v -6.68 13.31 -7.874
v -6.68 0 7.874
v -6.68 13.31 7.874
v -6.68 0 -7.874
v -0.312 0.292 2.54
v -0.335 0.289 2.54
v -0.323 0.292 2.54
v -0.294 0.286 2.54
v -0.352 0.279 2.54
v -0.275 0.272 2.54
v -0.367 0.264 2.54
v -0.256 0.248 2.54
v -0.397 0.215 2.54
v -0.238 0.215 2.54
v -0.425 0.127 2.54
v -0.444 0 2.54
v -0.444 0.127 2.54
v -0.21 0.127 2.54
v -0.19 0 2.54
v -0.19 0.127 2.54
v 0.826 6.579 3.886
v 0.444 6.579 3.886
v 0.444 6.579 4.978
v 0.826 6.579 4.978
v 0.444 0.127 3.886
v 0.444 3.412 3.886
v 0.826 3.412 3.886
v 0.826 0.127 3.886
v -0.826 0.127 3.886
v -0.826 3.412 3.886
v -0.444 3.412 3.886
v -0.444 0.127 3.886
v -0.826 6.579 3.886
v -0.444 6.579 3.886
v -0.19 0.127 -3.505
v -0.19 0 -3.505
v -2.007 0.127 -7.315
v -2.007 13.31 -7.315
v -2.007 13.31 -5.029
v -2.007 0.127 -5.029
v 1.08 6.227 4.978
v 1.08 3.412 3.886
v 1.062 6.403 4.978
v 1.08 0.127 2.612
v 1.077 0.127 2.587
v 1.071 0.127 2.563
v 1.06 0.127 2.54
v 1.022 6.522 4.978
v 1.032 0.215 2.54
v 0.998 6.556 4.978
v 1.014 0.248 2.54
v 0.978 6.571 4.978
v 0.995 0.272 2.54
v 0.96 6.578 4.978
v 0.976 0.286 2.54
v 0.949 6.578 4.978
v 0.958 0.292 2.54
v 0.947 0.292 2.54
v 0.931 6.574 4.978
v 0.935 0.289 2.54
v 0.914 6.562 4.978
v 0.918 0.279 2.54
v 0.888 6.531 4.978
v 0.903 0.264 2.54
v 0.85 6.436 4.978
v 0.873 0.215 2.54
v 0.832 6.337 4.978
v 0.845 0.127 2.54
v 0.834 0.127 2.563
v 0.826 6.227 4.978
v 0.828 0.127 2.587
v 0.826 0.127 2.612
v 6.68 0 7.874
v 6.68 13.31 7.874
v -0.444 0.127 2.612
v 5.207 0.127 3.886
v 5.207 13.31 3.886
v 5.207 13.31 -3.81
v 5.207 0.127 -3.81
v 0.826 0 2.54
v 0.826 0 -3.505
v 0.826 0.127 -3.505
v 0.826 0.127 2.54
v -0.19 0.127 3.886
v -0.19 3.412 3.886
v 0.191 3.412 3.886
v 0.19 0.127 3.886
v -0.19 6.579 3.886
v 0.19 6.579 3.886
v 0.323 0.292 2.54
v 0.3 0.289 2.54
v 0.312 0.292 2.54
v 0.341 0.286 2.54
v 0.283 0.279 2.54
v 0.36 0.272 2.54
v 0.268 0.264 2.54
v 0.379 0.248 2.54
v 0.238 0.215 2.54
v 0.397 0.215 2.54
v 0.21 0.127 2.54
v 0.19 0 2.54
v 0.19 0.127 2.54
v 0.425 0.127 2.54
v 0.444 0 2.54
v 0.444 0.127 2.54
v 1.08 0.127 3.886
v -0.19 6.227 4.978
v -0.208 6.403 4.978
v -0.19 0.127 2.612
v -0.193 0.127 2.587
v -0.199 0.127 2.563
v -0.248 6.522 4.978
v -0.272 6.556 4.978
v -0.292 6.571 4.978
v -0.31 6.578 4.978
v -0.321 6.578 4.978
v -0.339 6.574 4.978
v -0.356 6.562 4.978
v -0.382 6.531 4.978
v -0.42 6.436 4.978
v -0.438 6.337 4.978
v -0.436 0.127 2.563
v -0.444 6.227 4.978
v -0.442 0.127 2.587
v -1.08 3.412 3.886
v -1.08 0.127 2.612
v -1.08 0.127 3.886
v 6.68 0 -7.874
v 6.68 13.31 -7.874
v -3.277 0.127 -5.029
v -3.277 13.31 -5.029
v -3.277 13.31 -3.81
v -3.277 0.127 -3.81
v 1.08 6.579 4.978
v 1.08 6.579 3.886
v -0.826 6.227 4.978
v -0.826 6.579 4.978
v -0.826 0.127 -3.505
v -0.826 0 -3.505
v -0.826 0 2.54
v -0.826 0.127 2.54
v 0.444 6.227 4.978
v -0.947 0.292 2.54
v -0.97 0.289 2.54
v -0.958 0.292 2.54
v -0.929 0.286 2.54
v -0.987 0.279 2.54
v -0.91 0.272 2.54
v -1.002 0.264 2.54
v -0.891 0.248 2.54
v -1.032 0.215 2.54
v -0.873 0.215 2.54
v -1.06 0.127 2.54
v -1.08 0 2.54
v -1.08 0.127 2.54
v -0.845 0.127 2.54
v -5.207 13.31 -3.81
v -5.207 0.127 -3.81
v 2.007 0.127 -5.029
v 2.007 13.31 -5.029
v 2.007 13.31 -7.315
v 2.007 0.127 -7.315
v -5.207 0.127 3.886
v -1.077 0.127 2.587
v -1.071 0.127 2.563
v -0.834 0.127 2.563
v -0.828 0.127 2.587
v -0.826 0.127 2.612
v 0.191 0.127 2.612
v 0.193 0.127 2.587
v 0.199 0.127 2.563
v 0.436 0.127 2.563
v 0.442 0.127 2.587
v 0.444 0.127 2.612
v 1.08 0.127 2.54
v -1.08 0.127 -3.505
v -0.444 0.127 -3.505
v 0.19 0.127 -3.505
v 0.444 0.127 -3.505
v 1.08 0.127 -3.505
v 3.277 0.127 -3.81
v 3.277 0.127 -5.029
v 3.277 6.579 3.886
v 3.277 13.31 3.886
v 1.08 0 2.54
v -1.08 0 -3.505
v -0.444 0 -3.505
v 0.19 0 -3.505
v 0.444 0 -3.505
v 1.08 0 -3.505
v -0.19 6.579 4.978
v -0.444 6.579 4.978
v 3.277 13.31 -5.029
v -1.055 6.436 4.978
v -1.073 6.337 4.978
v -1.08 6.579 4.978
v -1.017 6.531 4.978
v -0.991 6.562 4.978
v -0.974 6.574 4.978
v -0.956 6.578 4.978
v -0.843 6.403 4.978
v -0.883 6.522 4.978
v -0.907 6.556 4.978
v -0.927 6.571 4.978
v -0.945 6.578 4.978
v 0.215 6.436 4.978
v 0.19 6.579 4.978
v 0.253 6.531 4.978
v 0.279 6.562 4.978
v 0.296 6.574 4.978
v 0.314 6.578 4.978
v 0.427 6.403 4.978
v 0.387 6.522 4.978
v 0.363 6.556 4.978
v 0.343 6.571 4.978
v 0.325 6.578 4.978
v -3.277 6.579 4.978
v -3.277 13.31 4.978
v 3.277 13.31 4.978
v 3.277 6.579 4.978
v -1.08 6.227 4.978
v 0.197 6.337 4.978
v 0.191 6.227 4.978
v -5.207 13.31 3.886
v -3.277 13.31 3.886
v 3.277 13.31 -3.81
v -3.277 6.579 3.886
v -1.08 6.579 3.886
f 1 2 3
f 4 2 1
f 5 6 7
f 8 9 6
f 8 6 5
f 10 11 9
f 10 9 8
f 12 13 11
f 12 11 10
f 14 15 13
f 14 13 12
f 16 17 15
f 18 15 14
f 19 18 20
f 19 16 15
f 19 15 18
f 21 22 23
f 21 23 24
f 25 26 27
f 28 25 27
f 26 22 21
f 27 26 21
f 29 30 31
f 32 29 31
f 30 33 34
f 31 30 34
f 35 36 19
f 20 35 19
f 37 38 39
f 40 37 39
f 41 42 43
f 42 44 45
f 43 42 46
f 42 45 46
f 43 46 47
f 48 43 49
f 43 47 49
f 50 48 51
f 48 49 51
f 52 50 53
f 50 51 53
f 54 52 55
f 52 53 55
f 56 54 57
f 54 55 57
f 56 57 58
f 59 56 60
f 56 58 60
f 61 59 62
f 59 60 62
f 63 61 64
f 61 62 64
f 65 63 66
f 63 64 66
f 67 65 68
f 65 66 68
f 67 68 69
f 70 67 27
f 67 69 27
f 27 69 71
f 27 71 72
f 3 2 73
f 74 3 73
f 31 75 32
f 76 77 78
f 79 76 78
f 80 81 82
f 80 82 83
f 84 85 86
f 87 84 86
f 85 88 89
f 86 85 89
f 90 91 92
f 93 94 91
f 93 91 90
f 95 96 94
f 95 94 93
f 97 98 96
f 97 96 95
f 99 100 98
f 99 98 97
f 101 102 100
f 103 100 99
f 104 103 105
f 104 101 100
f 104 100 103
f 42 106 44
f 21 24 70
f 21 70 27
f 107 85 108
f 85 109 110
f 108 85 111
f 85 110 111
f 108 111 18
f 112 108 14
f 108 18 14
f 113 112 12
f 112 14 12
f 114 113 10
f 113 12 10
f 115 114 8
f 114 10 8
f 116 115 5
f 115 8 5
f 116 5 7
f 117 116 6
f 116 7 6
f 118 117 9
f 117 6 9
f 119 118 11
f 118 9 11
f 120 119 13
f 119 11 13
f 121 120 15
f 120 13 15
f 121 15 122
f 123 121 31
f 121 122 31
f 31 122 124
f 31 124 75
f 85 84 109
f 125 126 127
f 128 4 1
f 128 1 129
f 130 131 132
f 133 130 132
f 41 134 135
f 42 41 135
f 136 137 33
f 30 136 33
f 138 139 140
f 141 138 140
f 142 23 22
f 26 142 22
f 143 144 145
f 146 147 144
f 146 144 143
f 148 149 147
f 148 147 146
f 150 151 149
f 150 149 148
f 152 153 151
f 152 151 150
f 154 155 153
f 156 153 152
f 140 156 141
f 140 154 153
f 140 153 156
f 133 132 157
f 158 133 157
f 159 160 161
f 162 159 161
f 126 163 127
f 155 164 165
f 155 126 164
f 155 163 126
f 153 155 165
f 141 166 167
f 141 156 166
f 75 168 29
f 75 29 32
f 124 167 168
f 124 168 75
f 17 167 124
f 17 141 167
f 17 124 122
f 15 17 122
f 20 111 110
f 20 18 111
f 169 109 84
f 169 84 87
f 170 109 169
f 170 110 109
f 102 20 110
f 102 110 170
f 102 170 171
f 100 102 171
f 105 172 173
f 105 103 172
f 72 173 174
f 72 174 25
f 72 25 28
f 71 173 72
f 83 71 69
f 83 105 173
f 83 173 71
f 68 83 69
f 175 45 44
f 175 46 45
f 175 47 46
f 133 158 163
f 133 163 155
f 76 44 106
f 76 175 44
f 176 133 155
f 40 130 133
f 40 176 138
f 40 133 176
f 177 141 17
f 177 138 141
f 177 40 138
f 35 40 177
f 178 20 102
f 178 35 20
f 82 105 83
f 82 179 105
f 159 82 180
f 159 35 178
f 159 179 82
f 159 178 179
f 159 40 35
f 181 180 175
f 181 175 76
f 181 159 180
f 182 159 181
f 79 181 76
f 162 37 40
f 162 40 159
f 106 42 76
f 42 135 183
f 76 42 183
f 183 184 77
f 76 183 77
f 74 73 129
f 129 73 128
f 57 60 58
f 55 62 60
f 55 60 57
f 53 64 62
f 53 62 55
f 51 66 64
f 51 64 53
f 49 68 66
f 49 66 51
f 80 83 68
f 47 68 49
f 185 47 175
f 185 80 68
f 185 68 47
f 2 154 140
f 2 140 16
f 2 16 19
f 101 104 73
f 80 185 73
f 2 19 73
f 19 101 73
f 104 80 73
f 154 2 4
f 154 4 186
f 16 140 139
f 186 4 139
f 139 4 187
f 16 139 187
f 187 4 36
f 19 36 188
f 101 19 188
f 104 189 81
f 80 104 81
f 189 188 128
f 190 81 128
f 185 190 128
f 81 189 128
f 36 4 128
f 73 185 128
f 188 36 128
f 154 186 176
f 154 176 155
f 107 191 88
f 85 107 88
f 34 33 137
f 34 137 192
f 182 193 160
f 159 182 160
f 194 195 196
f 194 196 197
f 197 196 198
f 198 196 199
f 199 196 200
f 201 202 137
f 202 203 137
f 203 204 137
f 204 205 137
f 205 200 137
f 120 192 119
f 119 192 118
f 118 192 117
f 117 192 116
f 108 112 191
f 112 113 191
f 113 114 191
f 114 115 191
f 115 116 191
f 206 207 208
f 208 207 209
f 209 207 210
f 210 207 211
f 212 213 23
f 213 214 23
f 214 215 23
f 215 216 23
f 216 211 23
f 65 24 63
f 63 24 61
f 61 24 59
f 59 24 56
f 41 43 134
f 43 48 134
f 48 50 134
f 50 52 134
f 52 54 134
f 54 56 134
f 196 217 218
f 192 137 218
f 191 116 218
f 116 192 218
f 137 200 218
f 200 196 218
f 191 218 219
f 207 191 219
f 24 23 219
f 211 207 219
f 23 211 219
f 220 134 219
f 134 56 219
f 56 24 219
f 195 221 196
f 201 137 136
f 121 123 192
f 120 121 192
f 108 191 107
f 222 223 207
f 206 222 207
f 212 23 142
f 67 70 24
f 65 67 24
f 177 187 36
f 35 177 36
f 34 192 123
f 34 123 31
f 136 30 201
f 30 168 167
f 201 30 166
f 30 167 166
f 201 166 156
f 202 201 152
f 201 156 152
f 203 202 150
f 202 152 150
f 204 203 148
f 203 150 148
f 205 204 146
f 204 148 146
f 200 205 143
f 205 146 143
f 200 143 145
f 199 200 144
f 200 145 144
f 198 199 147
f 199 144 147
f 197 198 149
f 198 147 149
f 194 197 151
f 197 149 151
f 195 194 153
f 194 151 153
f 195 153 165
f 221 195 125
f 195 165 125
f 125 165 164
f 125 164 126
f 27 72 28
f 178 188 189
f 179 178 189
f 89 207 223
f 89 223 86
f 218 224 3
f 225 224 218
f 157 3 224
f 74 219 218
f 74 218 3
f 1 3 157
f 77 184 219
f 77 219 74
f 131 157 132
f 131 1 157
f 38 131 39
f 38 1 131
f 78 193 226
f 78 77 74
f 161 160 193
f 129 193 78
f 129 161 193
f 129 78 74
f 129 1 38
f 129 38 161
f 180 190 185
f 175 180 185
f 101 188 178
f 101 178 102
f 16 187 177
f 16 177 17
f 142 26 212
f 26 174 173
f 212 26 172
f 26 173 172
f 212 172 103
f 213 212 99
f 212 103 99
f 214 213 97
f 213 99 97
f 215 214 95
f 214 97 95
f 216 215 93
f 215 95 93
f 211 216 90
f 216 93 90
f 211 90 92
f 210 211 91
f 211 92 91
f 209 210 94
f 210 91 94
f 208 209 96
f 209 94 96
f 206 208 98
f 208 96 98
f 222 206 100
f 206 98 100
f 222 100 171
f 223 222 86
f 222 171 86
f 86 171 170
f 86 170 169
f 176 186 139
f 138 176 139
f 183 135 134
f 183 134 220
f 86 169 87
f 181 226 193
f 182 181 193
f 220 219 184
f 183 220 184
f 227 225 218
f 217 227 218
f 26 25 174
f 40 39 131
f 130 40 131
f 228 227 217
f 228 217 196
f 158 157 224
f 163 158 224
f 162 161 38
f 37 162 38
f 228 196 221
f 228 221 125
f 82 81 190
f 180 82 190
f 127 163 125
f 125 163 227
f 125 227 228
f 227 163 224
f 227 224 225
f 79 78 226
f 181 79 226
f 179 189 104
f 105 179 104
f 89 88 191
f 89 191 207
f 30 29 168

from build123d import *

# Parameters (mm, degrees)
SKETCH1_W                       = 13.3604
SKETCH1_H                       = 15.748
BOSS_EXTRUDE1_DEPTH             = 13.3096
CUT_EXTRUDE1_DEPTH              = 6.731
CUT_EXTRUDE2_DEPTH              = 6.4516
SKETCH4_W                       = 0.254
SKETCH4_H                       = 1.0922
CUT_EXTRUDE3_DEPTH              = 6.4516
BOSS_EXTRUDE2_REACH             = 17.835
BOSS_EXTRUDE2_DIRECTION_2_REACH = 17.835
CUT_EXTRUDE4_REACH              = 18.845
SKETCH6_W                       = 0.254
SKETCH6_H                       = 6.0452


with BuildPart() as part:
    # Sketch1 → Boss-Extrude1 (new body)
    with BuildSketch(Plane(origin=(0, 0, 0), x_dir=(1, 0, 0), z_dir=(0, 1, 0))):
        Rectangle(SKETCH1_W, SKETCH1_H)
    extrude(amount=BOSS_EXTRUDE1_DEPTH)

    # Sketch2 → Cut-Extrude1 (cut)
    with BuildSketch(Plane(origin=(0, 13.3096, 0), x_dir=(1, 0, 0), z_dir=(0, 1, 0))):
        Polygon((-2.0066, 7.3152), (-2.0066, 5.0292), (-3.2766, 5.0292), (-3.2766, 3.81), (-5.207, 3.81), (-5.207, -3.8862), (-3.2766, -3.8862), (-3.2766, -4.9784), (3.2766, -4.9784), (3.2766, -3.8862), (5.207, -3.8862), (5.207, 3.81), (3.2766, 3.81), (3.2766, 5.0292), (2.0066, 5.0292), (2.0066, 7.3152), align=None)
    extrude(amount=-CUT_EXTRUDE1_DEPTH, mode=Mode.SUBTRACT)

    # Sketch3 → Cut-Extrude2 (cut)
    with BuildSketch(Plane(origin=(0, 6.5786, 0), x_dir=(1, 0, 0), z_dir=(0, 1, 0))):
        Polygon((-3.2766, -3.8862), (3.2766, -3.8862), (5.207, -3.8862), (5.207, 3.81), (3.2766, 3.81), (3.2766, 5.0292), (2.0066, 5.0292), (2.0066, 7.3152), (-2.0066, 7.3152), (-2.0066, 5.0292), (-3.2766, 5.0292), (-3.2766, 3.81), (-5.207, 3.81), (-5.207, -3.8862), align=None)
    extrude(amount=-CUT_EXTRUDE2_DEPTH, mode=Mode.SUBTRACT)

    # Sketch4 → Cut-Extrude3 (cut)
    with BuildSketch(Plane(origin=(0, 6.5786, 0), x_dir=(1, 0, 0), z_dir=(0, 1, 0))):
        with Locations((-0.9525, -4.4323)):
            Rectangle(SKETCH4_W, SKETCH4_H)
        with Locations((-0.3175, -4.4323)):
            Rectangle(SKETCH4_W, SKETCH4_H)
        with Locations((0.3175, -4.4323)):
            Rectangle(SKETCH4_W, SKETCH4_H)
        with Locations((0.9525, -4.4323)):
            Rectangle(SKETCH4_W, SKETCH4_H)
    extrude(amount=-CUT_EXTRUDE3_DEPTH, mode=Mode.SUBTRACT)

    # Sketch5 → Boss-Extrude2 (add, up to next)
    with BuildSketch(Plane(origin=(0, 1.788865417, 0.693855168), x_dir=(-1, 0, 0), z_dir=(0, -0.9323238012155132, -0.3616245700820899)), mode=Mode.PRIVATE) as boss_extrude2_sk1:
        with BuildLine():
            Line((1.0795, -4.595554492), (0.8255, -4.595554492))
            Line((0.8255, -4.595554492), (0.8255, -2.389497415))
            ThreePointArc((0.8255, -2.389497415), (0.9525, -2.262497415), (1.0795, -2.389497415))
            Line((1.0795, -2.389497415), (1.0795, -4.595554492))
        make_face()
    boss_extrude2_tool1 = extrude(boss_extrude2_sk1.sketch, amount=BOSS_EXTRUDE2_REACH, mode=Mode.PRIVATE) - part.part
    # Sketch5 → Boss-Extrude2 (add, up to next)
    with BuildSketch(Plane(origin=(0, 1.788865417, 0.693855168), x_dir=(-1, 0, 0), z_dir=(0, -0.9323238012155132, -0.3616245700820899)), mode=Mode.PRIVATE) as boss_extrude2_sk2:
        with BuildLine():
            Line((0.4445, -4.595554492), (0.1905, -4.595554492))
            Line((0.1905, -4.595554492), (0.1905, -2.389497415))
            ThreePointArc((0.1905, -2.389497415), (0.3175, -2.262497415), (0.4445, -2.389497415))
            Line((0.4445, -2.389497415), (0.4445, -4.595554492))
        make_face()
    boss_extrude2_tool2 = extrude(boss_extrude2_sk2.sketch, amount=BOSS_EXTRUDE2_REACH, mode=Mode.PRIVATE) - part.part
    # Sketch5 → Boss-Extrude2 (add, up to next)
    with BuildSketch(Plane(origin=(0, 1.788865417, 0.693855168), x_dir=(-1, 0, 0), z_dir=(0, -0.9323238012155132, -0.3616245700820899)), mode=Mode.PRIVATE) as boss_extrude2_sk3:
        with BuildLine():
            Line((-0.1905, -4.595554492), (-0.4445, -4.595554492))
            Line((-0.4445, -4.595554492), (-0.4445, -2.389497415))
            ThreePointArc((-0.4445, -2.389497415), (-0.3175, -2.262497415), (-0.1905, -2.389497415))
            Line((-0.1905, -2.389497415), (-0.1905, -4.595554492))
        make_face()
    boss_extrude2_tool3 = extrude(boss_extrude2_sk3.sketch, amount=BOSS_EXTRUDE2_REACH, mode=Mode.PRIVATE) - part.part
    # Sketch5 → Boss-Extrude2 (add, up to next)
    with BuildSketch(Plane(origin=(0, 1.788865417, 0.693855168), x_dir=(-1, 0, 0), z_dir=(0, -0.9323238012155132, -0.3616245700820899)), mode=Mode.PRIVATE) as boss_extrude2_sk4:
        with BuildLine():
            Line((-0.8255, -4.595554492), (-1.0795, -4.595554492))
            Line((-1.0795, -4.595554492), (-1.0795, -2.389497415))
            ThreePointArc((-1.0795, -2.389497415), (-0.9525, -2.262497415), (-0.8255, -2.389497415))
            Line((-0.8255, -2.389497415), (-0.8255, -4.595554492))
        make_face()
    boss_extrude2_tool4 = extrude(boss_extrude2_sk4.sketch, amount=BOSS_EXTRUDE2_REACH, mode=Mode.PRIVATE) - part.part
    add(boss_extrude2_tool1.solids().sort_by_distance((-0.9525, 0.54398, 3.90336))[0])
    add(boss_extrude2_tool2.solids().sort_by_distance((-0.3175, 0.54398, 3.90336))[0])
    add(boss_extrude2_tool3.solids().sort_by_distance((0.3175, 0.54398, 3.90336))[0])
    add(boss_extrude2_tool4.solids().sort_by_distance((0.9525, 0.54398, 3.90336))[0])

    # Sketch5 → Boss-Extrude2 direction 2 (add, up to next)
    with BuildSketch(Plane(origin=(0, 1.788865417, 0.693855168), x_dir=(-1, 0, 0), z_dir=(0, -0.9323238012155132, -0.3616245700820899)), mode=Mode.PRIVATE) as boss_extrude2_direction_2_sk1:
        with BuildLine():
            Line((1.0795, -4.595554492), (0.8255, -4.595554492))
            Line((0.8255, -4.595554492), (0.8255, -2.389497415))
            ThreePointArc((0.8255, -2.389497415), (0.9525, -2.262497415), (1.0795, -2.389497415))
            Line((1.0795, -2.389497415), (1.0795, -4.595554492))
        make_face()
    boss_extrude2_direction_2_tool1 = extrude(boss_extrude2_direction_2_sk1.sketch, amount=-BOSS_EXTRUDE2_DIRECTION_2_REACH, mode=Mode.PRIVATE) - part.part
    # Sketch5 → Boss-Extrude2 direction 2 (add, up to next)
    with BuildSketch(Plane(origin=(0, 1.788865417, 0.693855168), x_dir=(-1, 0, 0), z_dir=(0, -0.9323238012155132, -0.3616245700820899)), mode=Mode.PRIVATE) as boss_extrude2_direction_2_sk2:
        with BuildLine():
            Line((0.4445, -4.595554492), (0.1905, -4.595554492))
            Line((0.1905, -4.595554492), (0.1905, -2.389497415))
            ThreePointArc((0.1905, -2.389497415), (0.3175, -2.262497415), (0.4445, -2.389497415))
            Line((0.4445, -2.389497415), (0.4445, -4.595554492))
        make_face()
    boss_extrude2_direction_2_tool2 = extrude(boss_extrude2_direction_2_sk2.sketch, amount=-BOSS_EXTRUDE2_DIRECTION_2_REACH, mode=Mode.PRIVATE) - part.part
    # Sketch5 → Boss-Extrude2 direction 2 (add, up to next)
    with BuildSketch(Plane(origin=(0, 1.788865417, 0.693855168), x_dir=(-1, 0, 0), z_dir=(0, -0.9323238012155132, -0.3616245700820899)), mode=Mode.PRIVATE) as boss_extrude2_direction_2_sk3:
        with BuildLine():
            Line((-0.1905, -4.595554492), (-0.4445, -4.595554492))
            Line((-0.4445, -4.595554492), (-0.4445, -2.389497415))
            ThreePointArc((-0.4445, -2.389497415), (-0.3175, -2.262497415), (-0.1905, -2.389497415))
            Line((-0.1905, -2.389497415), (-0.1905, -4.595554492))
        make_face()
    boss_extrude2_direction_2_tool3 = extrude(boss_extrude2_direction_2_sk3.sketch, amount=-BOSS_EXTRUDE2_DIRECTION_2_REACH, mode=Mode.PRIVATE) - part.part
    # Sketch5 → Boss-Extrude2 direction 2 (add, up to next)
    with BuildSketch(Plane(origin=(0, 1.788865417, 0.693855168), x_dir=(-1, 0, 0), z_dir=(0, -0.9323238012155132, -0.3616245700820899)), mode=Mode.PRIVATE) as boss_extrude2_direction_2_sk4:
        with BuildLine():
            Line((-0.8255, -4.595554492), (-1.0795, -4.595554492))
            Line((-1.0795, -4.595554492), (-1.0795, -2.389497415))
            ThreePointArc((-1.0795, -2.389497415), (-0.9525, -2.262497415), (-0.8255, -2.389497415))
            Line((-0.8255, -2.389497415), (-0.8255, -4.595554492))
        make_face()
    boss_extrude2_direction_2_tool4 = extrude(boss_extrude2_direction_2_sk4.sketch, amount=-BOSS_EXTRUDE2_DIRECTION_2_REACH, mode=Mode.PRIVATE) - part.part
    add(boss_extrude2_direction_2_tool1.solids().sort_by_distance((-0.9525, 0.54398, 3.90336))[0])
    add(boss_extrude2_direction_2_tool2.solids().sort_by_distance((-0.3175, 0.54398, 3.90336))[0])
    add(boss_extrude2_direction_2_tool3.solids().sort_by_distance((0.3175, 0.54398, 3.90336))[0])
    add(boss_extrude2_direction_2_tool4.solids().sort_by_distance((0.9525, 0.54398, 3.90336))[0])

    # Sketch6 → Cut-Extrude4 (cut, up to next)
    with BuildSketch(Plane.XZ, mode=Mode.PRIVATE) as cut_extrude4_sk1:
        with Locations((-0.9525, -0.4826)):
            Rectangle(SKETCH6_W, SKETCH6_H)
    cut_extrude4_tool1 = extrude(cut_extrude4_sk1.sketch, amount=-CUT_EXTRUDE4_REACH, mode=Mode.PRIVATE) & part.part
    # Sketch6 → Cut-Extrude4 (cut, up to next)
    with BuildSketch(Plane.XZ, mode=Mode.PRIVATE) as cut_extrude4_sk2:
        with Locations((-0.3175, -0.4826)):
            Rectangle(SKETCH6_W, SKETCH6_H)
    cut_extrude4_tool2 = extrude(cut_extrude4_sk2.sketch, amount=-CUT_EXTRUDE4_REACH, mode=Mode.PRIVATE) & part.part
    # Sketch6 → Cut-Extrude4 (cut, up to next)
    with BuildSketch(Plane.XZ, mode=Mode.PRIVATE) as cut_extrude4_sk3:
        with Locations((0.9525, -0.4826)):
            Rectangle(SKETCH6_W, SKETCH6_H)
    cut_extrude4_tool3 = extrude(cut_extrude4_sk3.sketch, amount=-CUT_EXTRUDE4_REACH, mode=Mode.PRIVATE) & part.part
    # Sketch6 → Cut-Extrude4 (cut, up to next)
    with BuildSketch(Plane.XZ, mode=Mode.PRIVATE) as cut_extrude4_sk4:
        with Locations((0.3175, -0.4826)):
            Rectangle(SKETCH6_W, SKETCH6_H)
    cut_extrude4_tool4 = extrude(cut_extrude4_sk4.sketch, amount=-CUT_EXTRUDE4_REACH, mode=Mode.PRIVATE) & part.part
    add(cut_extrude4_tool1.solids().sort_by_distance((-0.9525, 0, -0.4826))[0], mode=Mode.SUBTRACT)
    add(cut_extrude4_tool2.solids().sort_by_distance((-0.3175, 0, -0.4826))[0], mode=Mode.SUBTRACT)
    add(cut_extrude4_tool3.solids().sort_by_distance((0.9525, 0, -0.4826))[0], mode=Mode.SUBTRACT)
    add(cut_extrude4_tool4.solids().sort_by_distance((0.3175, 0, -0.4826))[0], mode=Mode.SUBTRACT)


solid = part.part
